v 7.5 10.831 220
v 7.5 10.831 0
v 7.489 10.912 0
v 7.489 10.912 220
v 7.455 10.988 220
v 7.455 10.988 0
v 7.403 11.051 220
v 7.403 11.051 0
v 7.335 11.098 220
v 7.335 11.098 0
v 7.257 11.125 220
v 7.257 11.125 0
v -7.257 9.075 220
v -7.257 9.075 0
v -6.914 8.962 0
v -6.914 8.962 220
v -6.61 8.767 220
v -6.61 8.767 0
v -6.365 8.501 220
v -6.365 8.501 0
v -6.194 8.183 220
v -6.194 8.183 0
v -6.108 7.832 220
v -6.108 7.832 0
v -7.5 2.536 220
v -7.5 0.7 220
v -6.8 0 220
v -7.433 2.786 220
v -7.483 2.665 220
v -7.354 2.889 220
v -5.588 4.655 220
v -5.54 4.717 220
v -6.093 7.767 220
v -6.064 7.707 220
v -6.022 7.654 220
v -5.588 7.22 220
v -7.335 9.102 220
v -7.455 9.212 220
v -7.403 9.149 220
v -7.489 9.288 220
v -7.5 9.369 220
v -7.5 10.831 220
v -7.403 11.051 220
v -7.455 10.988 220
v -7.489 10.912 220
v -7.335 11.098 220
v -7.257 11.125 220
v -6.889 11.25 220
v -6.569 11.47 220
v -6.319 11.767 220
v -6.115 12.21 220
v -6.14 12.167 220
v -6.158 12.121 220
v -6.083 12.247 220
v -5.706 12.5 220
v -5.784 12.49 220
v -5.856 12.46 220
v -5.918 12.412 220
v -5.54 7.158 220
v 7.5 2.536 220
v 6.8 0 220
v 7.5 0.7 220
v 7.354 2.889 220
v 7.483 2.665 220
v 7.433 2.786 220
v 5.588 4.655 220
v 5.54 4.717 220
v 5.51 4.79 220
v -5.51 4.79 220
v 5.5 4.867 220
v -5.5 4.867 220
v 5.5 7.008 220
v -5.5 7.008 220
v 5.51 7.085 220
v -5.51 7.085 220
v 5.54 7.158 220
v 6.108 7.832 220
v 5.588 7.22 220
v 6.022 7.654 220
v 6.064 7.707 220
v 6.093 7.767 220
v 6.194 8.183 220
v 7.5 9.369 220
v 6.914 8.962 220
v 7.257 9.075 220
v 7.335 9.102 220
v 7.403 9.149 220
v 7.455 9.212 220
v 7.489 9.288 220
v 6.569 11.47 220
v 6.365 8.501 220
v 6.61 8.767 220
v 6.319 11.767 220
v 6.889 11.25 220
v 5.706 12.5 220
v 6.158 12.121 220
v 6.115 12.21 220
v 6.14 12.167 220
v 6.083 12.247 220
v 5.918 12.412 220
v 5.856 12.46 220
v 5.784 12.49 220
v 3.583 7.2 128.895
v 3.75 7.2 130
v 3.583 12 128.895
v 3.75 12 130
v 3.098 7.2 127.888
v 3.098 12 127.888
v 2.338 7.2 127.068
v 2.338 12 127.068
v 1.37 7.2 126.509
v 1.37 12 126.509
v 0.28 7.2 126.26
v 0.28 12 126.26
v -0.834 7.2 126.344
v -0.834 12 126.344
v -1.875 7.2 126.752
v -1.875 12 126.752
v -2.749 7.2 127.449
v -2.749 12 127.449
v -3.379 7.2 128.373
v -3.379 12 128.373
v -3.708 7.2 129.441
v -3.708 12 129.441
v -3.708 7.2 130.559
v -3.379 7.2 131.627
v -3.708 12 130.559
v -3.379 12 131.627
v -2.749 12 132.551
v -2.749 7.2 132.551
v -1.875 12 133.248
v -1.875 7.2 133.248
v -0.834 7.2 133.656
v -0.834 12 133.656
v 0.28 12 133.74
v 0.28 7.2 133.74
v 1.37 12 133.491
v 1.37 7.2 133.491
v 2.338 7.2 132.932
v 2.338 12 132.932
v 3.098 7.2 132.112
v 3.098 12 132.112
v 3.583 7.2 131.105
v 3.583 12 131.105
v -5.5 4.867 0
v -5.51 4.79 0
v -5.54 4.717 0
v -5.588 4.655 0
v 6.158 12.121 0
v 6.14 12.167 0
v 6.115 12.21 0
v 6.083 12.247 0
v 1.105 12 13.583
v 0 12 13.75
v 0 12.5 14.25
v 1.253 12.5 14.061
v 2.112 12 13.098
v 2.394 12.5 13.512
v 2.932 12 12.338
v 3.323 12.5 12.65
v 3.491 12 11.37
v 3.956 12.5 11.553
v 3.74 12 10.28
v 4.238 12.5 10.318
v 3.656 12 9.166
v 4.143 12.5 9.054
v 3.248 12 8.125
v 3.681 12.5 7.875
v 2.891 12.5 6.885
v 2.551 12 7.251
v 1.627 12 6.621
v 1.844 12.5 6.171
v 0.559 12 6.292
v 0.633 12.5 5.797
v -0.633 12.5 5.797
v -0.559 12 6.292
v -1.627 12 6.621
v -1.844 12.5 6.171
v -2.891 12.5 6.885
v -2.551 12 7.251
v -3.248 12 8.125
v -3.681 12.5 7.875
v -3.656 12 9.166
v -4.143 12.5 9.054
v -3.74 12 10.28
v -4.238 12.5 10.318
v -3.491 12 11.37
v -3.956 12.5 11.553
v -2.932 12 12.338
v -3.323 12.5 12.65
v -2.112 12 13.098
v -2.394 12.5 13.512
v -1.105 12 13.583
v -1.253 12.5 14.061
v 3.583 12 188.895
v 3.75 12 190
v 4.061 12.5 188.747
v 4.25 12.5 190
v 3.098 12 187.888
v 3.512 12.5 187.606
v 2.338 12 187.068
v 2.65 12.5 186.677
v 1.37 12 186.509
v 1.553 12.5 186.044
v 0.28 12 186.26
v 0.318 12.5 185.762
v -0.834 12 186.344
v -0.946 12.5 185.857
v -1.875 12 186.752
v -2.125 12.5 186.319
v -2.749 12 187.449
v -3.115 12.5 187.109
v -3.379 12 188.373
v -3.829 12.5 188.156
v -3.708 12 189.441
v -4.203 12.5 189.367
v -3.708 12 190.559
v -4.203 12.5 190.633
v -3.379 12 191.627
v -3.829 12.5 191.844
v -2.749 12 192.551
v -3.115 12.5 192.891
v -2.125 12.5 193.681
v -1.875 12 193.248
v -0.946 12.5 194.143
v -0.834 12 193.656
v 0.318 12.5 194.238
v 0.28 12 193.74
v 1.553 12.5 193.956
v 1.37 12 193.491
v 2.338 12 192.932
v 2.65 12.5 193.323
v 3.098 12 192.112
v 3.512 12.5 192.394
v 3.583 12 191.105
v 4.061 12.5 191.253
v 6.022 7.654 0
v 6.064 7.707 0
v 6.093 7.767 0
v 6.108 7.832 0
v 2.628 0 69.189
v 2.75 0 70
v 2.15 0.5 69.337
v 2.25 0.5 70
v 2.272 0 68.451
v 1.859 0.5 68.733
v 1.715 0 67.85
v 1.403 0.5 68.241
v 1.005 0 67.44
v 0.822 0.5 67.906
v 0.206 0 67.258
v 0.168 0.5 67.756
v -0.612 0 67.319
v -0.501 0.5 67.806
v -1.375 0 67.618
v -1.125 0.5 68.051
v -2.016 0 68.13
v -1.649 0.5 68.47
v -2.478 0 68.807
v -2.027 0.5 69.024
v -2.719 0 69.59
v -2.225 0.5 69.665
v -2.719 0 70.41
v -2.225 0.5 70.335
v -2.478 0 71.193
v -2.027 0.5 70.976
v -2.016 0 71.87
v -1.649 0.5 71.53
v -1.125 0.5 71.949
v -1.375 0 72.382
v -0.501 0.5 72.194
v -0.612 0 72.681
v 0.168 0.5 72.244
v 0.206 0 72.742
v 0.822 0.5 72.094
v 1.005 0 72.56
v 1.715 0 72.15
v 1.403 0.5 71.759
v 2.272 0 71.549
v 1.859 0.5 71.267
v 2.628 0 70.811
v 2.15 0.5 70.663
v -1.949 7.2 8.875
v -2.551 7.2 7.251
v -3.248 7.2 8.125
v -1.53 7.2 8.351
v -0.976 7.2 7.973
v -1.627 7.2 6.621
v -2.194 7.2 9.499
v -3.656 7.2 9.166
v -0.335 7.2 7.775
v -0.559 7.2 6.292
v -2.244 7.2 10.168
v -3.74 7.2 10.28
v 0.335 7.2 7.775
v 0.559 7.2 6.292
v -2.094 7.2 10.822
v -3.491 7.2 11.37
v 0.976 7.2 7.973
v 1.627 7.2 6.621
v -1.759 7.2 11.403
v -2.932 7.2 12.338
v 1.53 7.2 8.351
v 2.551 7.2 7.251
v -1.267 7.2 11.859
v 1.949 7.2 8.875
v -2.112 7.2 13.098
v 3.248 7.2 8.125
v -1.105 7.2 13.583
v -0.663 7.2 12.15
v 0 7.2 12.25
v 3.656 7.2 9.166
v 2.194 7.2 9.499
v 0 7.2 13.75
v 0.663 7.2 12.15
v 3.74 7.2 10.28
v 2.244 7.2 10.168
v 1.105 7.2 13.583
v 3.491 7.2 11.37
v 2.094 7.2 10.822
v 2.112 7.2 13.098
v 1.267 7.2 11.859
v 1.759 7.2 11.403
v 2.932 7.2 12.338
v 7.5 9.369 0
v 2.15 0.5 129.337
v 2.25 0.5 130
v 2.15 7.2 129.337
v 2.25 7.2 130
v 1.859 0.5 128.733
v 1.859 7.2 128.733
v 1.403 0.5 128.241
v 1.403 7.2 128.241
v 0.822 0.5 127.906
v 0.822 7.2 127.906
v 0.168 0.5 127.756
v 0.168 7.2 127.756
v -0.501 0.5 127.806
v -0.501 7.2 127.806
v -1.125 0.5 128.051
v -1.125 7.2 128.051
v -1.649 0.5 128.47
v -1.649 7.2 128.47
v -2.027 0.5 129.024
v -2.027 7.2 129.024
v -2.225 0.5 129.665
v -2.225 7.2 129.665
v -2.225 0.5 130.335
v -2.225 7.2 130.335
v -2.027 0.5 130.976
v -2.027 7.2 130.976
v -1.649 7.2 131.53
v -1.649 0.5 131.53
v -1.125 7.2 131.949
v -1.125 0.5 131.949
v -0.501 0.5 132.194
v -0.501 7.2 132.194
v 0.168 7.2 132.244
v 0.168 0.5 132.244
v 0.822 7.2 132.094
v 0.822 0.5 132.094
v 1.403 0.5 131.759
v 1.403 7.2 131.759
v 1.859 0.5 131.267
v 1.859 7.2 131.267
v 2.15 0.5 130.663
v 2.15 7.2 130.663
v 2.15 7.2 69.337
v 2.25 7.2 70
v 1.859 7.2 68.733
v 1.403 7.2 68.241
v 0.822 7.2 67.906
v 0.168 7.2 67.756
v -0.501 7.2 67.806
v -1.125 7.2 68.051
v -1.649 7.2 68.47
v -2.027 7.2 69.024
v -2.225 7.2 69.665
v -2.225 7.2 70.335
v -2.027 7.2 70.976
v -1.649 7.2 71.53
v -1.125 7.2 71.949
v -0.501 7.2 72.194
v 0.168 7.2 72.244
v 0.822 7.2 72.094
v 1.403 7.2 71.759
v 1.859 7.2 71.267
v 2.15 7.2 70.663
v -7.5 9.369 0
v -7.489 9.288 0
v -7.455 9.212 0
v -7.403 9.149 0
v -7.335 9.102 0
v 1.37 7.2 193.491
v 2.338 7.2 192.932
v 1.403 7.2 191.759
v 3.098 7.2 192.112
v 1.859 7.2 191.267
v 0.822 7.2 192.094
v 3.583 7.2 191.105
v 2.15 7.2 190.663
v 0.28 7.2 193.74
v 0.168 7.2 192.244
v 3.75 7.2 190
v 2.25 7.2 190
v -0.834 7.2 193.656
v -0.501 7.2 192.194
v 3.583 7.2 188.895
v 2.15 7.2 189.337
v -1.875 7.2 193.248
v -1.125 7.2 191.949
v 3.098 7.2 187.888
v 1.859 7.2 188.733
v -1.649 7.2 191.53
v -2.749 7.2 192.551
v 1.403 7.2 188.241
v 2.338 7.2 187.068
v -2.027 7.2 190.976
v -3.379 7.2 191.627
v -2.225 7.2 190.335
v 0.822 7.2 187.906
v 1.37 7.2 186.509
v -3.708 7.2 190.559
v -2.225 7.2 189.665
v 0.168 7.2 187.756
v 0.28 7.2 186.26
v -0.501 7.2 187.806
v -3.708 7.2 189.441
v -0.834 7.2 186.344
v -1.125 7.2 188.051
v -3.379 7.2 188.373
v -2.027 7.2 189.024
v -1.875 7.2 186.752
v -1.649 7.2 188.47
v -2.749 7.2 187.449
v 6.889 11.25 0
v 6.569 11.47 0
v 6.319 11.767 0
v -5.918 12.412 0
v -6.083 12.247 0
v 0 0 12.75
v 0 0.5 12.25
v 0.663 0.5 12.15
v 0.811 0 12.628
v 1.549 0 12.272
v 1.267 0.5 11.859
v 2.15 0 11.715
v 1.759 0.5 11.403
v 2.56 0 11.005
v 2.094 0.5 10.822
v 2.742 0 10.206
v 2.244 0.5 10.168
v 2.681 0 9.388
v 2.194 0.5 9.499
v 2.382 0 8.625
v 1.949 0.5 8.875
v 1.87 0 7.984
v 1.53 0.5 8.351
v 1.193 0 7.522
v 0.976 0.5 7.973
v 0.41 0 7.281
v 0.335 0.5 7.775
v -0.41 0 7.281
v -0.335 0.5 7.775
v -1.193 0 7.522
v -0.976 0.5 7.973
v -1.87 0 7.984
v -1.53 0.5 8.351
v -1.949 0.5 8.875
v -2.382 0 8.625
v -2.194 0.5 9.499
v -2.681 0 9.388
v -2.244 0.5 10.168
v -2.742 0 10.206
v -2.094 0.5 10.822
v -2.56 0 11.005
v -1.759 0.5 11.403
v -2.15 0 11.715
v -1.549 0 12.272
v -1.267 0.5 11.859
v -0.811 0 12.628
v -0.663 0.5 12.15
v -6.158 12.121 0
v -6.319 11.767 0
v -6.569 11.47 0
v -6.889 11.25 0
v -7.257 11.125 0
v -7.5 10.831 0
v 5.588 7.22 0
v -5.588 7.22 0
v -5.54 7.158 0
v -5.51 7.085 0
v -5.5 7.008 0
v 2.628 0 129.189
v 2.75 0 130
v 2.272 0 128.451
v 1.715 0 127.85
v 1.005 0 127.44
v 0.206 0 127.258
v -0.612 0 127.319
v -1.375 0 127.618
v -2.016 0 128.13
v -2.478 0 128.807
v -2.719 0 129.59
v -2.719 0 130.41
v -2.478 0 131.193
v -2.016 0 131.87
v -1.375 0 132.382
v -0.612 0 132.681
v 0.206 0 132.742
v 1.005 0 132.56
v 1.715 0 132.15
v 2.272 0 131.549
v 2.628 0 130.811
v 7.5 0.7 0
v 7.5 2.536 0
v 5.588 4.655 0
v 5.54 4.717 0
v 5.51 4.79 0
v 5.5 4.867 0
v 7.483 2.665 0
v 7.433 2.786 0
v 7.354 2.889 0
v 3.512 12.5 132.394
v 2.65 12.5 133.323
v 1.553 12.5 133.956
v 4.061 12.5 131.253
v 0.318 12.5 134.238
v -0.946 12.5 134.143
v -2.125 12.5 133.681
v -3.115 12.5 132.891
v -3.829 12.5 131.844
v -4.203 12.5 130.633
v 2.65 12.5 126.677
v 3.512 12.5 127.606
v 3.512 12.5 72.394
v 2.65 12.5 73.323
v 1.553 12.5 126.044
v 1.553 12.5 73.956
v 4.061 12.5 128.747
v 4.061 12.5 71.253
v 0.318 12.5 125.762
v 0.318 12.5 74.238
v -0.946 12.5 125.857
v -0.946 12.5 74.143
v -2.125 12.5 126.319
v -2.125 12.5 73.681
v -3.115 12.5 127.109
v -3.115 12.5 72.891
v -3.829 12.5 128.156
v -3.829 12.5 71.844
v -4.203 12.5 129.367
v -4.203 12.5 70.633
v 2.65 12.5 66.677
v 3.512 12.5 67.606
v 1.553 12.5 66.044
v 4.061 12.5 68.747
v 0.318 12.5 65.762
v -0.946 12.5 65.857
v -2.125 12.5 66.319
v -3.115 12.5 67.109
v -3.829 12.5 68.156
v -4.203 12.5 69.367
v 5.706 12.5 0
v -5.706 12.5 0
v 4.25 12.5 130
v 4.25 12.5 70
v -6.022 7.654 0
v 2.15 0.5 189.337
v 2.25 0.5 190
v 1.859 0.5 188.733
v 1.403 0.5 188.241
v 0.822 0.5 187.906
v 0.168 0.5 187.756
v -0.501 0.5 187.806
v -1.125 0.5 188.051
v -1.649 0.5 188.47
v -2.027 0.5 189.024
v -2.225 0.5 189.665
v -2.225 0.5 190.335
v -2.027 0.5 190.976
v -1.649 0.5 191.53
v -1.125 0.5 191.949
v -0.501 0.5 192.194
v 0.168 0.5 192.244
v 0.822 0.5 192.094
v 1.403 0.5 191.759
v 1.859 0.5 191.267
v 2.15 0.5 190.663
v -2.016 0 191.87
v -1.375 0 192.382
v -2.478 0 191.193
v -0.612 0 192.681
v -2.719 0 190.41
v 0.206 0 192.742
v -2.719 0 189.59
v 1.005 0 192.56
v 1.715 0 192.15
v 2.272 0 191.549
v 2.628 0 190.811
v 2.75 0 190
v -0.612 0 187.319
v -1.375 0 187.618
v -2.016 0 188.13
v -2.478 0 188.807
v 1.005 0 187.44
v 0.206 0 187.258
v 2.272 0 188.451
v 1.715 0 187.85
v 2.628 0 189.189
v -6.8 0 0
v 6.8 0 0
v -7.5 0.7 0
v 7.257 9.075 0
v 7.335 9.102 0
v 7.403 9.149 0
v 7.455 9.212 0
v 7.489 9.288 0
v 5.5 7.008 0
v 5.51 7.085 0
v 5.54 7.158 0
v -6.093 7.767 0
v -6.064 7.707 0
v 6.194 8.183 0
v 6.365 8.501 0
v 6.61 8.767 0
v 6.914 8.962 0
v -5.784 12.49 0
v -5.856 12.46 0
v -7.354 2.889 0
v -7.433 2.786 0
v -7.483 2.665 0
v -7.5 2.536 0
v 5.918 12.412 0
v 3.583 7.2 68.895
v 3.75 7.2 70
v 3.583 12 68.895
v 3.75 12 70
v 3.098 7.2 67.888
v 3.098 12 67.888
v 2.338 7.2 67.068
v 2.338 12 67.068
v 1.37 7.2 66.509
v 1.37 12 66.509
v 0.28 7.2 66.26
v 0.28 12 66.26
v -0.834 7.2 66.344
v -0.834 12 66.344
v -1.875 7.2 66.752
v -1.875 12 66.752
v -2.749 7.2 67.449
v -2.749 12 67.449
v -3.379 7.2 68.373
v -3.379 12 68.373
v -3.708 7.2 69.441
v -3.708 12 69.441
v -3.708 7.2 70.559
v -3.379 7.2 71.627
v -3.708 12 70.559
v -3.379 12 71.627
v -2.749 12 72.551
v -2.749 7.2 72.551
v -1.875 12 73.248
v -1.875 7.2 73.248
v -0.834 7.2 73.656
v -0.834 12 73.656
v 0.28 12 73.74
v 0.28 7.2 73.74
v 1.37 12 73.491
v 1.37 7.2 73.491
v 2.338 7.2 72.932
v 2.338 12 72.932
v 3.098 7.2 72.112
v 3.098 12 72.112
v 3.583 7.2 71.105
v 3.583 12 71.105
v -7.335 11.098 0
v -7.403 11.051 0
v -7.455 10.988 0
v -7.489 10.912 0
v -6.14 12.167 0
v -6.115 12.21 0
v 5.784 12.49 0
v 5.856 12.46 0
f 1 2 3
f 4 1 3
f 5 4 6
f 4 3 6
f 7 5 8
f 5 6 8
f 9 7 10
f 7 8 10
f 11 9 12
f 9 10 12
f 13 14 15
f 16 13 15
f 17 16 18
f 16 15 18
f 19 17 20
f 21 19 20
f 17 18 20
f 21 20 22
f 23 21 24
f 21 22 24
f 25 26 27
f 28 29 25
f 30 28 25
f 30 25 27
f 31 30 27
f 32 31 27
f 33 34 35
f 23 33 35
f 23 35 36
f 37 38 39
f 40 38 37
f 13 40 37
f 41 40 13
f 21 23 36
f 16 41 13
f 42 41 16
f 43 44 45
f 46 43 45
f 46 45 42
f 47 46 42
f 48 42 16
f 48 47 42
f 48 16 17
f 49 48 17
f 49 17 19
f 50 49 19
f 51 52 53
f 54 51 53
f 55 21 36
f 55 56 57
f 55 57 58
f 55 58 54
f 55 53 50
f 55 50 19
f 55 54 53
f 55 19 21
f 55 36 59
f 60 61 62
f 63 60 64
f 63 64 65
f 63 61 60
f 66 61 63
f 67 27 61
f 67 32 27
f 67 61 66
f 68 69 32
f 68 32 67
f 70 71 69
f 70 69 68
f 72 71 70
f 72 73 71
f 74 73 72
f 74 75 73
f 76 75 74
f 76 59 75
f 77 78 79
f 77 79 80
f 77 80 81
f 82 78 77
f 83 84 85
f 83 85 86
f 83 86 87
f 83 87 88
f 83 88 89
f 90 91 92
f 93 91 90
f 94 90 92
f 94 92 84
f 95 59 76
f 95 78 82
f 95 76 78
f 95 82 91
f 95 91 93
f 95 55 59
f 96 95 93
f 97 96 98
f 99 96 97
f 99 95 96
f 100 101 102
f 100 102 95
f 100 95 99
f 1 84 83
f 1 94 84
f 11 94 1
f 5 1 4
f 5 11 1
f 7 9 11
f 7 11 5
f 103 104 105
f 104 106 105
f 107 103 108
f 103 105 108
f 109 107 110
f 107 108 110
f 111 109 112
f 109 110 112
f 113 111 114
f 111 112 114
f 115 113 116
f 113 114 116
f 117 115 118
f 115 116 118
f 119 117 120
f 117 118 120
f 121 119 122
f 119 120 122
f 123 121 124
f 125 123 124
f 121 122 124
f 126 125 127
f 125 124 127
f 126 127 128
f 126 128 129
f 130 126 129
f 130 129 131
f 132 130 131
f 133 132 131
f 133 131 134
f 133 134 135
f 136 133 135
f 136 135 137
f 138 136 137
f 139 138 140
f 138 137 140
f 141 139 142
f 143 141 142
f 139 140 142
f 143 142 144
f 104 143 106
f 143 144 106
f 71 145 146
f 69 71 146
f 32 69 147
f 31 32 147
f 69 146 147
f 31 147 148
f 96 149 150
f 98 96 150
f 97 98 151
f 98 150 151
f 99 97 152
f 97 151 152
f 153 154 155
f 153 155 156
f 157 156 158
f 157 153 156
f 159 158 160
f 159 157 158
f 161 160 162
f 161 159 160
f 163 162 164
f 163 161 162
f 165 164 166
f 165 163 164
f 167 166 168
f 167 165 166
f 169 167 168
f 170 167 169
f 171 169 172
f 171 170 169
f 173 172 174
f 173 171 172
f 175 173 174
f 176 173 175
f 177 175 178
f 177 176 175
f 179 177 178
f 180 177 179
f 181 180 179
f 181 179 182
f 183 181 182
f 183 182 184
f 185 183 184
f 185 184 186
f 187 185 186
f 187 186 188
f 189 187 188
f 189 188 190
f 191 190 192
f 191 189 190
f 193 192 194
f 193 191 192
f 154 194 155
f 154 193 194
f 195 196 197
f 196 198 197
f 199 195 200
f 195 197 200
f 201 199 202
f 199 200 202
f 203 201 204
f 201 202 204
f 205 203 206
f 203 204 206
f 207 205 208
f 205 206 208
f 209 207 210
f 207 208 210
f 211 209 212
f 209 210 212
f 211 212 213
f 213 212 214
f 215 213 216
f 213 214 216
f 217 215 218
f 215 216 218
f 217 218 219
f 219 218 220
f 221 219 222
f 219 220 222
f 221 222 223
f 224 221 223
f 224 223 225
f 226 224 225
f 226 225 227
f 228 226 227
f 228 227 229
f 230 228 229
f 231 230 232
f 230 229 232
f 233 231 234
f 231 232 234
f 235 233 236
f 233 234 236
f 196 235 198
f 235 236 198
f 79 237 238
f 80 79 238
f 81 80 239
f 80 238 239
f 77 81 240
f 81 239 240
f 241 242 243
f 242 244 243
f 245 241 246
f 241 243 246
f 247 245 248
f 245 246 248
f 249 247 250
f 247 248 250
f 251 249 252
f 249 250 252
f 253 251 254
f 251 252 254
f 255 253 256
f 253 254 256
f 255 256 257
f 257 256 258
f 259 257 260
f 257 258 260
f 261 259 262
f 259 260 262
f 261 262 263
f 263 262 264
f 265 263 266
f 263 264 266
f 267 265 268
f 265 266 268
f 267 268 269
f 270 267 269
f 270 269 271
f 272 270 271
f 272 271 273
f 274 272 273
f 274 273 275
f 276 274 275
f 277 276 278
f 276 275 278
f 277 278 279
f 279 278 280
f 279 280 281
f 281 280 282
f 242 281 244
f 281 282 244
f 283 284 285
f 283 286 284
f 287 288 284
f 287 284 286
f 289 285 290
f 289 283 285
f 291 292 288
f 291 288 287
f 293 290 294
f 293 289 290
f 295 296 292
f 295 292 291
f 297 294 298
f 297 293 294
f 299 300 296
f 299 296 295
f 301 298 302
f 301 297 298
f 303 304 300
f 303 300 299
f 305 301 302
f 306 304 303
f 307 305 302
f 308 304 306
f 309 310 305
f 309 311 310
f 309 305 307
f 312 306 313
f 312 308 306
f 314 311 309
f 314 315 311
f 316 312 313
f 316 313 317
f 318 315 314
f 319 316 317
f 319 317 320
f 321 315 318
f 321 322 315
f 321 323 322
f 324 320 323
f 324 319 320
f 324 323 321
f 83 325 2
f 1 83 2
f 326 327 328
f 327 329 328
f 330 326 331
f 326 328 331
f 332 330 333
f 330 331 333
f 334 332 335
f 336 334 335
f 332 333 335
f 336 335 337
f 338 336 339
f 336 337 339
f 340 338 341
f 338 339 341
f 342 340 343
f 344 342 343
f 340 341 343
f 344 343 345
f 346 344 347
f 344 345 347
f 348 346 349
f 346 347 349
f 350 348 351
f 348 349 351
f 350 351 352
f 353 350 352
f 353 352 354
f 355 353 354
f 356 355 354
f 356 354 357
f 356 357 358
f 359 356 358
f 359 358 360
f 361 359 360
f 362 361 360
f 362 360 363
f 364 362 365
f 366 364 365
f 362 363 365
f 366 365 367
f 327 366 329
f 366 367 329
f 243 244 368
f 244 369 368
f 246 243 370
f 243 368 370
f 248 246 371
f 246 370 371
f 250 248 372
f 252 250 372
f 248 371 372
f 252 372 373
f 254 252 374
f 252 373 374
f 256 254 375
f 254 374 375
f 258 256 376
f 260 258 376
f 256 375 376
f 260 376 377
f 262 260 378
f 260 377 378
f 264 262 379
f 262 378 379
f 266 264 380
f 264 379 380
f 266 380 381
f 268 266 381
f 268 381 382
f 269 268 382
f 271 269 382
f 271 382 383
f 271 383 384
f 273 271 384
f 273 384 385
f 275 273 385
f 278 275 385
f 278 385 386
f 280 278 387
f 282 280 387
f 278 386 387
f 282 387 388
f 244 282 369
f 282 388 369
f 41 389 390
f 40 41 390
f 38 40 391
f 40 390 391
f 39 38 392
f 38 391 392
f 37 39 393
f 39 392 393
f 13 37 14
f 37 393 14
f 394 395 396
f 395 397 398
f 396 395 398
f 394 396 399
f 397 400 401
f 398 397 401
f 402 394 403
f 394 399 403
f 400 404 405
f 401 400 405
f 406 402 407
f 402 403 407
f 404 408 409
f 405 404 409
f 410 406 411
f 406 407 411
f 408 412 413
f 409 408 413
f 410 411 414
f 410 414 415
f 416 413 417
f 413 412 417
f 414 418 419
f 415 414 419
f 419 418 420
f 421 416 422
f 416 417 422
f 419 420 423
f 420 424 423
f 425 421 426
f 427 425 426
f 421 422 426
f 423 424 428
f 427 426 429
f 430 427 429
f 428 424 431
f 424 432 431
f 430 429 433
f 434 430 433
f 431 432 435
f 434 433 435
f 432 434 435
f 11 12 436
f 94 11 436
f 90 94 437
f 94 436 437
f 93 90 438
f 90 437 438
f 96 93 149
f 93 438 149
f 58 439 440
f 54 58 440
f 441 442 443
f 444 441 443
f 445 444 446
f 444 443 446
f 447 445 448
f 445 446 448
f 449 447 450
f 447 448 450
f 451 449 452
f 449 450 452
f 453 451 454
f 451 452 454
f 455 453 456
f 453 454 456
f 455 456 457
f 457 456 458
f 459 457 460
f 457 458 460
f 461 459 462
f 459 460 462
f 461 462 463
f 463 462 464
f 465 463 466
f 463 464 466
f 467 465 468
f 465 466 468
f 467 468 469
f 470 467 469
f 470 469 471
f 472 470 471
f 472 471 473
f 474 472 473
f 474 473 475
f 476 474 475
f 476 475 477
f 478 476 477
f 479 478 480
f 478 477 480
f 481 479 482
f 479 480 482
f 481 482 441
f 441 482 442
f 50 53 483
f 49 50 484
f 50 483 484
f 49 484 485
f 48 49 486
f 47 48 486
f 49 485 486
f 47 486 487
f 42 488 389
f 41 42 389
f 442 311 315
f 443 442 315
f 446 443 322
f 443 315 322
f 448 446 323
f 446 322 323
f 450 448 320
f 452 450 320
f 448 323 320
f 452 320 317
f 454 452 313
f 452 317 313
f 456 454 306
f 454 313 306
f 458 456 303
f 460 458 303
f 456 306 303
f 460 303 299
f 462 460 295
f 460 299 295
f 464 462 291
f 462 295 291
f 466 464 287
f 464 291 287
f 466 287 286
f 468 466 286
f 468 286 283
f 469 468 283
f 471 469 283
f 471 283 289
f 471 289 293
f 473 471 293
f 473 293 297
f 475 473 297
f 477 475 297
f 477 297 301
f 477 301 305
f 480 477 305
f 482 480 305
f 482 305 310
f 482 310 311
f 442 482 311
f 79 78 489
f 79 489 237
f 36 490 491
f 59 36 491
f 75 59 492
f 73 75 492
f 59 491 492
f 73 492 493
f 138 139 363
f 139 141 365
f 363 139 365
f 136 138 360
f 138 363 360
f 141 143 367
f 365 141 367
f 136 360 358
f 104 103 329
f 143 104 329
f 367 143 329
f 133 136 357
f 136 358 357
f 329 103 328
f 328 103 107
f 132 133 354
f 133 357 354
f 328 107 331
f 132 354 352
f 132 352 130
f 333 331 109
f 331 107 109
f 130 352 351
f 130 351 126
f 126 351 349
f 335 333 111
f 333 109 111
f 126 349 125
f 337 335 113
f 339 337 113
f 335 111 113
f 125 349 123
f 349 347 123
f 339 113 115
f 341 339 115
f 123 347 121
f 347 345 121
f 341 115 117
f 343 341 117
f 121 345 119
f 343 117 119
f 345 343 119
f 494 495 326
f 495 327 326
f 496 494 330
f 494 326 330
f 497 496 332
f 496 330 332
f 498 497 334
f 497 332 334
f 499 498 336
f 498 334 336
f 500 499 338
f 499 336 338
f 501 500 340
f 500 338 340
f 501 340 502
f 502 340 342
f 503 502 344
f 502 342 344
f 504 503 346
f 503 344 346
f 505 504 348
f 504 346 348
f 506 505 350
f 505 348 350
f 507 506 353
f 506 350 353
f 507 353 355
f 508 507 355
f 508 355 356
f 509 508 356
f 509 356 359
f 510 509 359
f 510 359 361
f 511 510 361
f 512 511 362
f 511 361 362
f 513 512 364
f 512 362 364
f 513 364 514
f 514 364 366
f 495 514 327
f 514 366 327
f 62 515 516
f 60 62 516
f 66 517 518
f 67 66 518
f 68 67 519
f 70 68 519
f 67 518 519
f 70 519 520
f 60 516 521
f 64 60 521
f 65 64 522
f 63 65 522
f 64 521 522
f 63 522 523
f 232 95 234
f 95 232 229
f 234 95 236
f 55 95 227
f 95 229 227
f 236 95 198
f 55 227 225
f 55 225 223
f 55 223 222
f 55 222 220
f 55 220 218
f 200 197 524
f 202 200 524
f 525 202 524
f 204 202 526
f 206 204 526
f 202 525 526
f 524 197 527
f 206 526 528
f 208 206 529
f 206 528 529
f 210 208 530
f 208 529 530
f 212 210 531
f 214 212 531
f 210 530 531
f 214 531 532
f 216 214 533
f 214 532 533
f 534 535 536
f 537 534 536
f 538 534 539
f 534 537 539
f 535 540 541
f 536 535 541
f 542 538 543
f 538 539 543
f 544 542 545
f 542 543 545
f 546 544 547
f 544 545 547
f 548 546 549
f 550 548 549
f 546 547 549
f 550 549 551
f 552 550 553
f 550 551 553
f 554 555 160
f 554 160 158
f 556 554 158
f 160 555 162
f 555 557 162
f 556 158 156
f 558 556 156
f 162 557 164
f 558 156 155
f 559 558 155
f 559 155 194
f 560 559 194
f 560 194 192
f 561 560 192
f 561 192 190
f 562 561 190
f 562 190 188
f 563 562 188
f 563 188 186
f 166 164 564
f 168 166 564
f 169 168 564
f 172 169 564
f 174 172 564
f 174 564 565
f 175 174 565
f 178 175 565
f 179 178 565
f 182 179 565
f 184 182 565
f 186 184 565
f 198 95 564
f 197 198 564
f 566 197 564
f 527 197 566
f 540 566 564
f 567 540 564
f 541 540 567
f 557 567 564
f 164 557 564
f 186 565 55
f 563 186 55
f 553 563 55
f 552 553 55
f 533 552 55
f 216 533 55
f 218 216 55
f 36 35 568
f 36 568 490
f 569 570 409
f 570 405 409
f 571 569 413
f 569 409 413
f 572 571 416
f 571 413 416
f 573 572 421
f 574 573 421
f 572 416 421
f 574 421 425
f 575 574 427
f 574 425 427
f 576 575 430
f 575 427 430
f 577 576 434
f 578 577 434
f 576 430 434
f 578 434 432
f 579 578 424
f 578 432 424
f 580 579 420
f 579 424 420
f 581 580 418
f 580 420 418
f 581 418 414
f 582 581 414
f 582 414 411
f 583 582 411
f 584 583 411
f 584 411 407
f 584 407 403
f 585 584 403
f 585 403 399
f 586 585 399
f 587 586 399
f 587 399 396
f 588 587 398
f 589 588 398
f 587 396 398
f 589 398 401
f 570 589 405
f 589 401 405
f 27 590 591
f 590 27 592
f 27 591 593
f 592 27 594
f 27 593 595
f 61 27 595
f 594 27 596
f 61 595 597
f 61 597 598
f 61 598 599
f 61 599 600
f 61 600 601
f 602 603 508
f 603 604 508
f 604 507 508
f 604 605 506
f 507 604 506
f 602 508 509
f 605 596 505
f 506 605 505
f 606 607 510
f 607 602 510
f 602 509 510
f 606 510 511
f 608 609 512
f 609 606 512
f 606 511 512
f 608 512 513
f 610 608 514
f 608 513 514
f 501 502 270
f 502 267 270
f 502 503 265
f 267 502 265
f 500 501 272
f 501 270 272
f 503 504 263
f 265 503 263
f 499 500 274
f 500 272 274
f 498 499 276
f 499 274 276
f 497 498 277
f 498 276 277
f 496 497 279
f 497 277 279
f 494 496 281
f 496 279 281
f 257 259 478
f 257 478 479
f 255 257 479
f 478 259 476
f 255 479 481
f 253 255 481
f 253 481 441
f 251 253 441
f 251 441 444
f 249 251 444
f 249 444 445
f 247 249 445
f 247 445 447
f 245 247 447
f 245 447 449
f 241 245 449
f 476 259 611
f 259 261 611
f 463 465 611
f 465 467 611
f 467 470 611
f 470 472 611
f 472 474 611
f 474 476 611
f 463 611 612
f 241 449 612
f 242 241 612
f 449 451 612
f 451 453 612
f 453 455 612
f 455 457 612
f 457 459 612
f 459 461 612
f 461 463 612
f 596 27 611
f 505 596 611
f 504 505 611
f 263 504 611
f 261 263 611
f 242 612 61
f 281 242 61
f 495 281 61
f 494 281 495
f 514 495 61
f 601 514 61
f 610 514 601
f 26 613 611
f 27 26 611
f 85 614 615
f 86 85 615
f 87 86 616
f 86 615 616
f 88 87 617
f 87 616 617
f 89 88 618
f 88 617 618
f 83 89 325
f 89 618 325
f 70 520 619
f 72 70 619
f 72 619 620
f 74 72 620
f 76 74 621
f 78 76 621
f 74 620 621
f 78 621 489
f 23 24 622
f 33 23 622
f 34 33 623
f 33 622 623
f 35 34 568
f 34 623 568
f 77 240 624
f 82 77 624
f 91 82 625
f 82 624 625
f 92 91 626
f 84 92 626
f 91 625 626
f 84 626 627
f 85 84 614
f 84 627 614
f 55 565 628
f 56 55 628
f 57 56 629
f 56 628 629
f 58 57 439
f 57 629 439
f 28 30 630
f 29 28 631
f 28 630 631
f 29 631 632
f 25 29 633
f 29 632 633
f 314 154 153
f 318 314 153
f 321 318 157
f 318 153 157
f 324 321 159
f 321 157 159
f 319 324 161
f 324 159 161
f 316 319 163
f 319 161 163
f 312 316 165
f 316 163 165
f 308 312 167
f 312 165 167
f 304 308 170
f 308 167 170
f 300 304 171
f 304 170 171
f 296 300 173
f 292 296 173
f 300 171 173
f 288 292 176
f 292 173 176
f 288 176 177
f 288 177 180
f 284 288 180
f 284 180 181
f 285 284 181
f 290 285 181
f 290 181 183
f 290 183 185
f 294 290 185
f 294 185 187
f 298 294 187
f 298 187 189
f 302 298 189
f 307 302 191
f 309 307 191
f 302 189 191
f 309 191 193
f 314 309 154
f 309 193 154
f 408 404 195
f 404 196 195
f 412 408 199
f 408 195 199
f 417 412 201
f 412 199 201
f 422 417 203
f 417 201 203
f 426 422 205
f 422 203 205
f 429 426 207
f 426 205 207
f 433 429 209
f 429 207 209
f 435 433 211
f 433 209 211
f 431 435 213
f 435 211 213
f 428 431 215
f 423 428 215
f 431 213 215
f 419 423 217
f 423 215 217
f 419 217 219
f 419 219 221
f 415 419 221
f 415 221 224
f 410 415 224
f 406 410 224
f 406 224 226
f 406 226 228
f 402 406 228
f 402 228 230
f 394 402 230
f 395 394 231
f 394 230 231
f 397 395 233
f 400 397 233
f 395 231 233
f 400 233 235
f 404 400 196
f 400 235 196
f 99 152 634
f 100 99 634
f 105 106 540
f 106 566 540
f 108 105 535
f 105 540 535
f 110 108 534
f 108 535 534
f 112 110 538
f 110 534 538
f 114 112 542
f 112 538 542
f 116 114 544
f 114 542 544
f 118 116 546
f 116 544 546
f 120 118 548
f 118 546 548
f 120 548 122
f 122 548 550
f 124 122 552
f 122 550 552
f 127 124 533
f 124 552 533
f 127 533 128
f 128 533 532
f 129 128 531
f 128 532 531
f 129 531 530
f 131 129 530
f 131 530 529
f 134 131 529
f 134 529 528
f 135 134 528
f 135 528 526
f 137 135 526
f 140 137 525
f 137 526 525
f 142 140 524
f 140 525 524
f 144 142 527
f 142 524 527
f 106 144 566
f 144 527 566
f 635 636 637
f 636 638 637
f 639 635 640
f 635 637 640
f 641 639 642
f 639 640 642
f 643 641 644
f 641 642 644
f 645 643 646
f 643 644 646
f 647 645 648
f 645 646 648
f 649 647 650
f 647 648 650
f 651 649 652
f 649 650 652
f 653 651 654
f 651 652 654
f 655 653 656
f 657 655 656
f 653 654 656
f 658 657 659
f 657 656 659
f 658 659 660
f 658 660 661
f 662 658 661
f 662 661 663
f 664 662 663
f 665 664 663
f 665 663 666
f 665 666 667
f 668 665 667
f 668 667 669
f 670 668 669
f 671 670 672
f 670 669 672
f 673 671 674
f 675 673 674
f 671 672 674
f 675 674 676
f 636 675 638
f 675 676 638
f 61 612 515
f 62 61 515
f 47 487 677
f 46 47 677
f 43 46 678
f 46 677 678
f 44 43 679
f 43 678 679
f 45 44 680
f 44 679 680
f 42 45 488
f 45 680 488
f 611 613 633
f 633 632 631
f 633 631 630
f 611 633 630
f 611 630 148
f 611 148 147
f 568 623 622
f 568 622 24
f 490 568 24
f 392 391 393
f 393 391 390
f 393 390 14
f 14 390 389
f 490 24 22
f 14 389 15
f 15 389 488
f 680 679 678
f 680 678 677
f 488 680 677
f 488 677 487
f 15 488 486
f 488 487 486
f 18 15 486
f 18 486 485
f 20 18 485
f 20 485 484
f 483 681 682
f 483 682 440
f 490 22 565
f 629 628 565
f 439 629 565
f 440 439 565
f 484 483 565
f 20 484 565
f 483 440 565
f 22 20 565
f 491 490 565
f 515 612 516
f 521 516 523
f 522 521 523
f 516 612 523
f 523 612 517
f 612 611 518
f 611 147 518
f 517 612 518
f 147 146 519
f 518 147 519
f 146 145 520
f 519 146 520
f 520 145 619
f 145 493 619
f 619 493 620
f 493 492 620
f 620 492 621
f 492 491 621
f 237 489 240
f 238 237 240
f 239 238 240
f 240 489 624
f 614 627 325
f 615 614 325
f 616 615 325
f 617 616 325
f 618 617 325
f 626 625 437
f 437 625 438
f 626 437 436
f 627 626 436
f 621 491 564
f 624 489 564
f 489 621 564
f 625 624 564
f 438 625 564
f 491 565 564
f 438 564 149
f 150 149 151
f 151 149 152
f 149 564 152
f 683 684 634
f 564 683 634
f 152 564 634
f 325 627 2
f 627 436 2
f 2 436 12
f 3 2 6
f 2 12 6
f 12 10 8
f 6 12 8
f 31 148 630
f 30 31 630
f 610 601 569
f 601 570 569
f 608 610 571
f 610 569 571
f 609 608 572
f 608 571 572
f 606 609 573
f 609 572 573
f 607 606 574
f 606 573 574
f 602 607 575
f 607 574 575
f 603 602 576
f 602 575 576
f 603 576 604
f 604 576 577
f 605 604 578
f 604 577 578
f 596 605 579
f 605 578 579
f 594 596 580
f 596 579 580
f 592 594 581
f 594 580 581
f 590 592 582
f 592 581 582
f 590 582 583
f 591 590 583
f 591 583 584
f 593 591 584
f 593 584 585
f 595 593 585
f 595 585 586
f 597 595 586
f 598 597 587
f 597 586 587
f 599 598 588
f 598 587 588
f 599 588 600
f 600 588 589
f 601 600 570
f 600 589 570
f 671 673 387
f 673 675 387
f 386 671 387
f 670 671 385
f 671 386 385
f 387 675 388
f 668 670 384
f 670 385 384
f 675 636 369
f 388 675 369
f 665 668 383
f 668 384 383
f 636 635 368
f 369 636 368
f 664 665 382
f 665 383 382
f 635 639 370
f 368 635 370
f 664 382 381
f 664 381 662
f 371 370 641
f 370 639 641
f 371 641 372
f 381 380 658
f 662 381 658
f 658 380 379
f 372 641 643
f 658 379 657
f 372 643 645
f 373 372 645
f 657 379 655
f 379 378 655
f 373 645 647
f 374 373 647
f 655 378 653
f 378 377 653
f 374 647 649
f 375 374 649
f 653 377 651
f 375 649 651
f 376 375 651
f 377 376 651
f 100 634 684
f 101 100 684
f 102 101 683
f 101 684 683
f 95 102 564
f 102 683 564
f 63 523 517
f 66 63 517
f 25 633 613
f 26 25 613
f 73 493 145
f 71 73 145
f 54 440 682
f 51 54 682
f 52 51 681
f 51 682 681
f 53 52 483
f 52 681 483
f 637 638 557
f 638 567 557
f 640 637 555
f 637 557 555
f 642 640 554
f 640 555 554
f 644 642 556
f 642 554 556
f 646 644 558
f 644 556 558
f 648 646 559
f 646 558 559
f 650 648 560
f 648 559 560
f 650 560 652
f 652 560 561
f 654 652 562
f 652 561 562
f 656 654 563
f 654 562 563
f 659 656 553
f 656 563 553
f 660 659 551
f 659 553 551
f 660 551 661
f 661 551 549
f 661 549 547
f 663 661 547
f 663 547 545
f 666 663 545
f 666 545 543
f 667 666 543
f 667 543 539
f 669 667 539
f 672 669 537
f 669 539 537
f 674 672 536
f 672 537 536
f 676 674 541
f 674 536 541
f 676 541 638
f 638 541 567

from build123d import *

# Parameters (mm, degrees)
BOSS_EXTRUDE1_DEPTH = 220
SKETCH2_R           = 3.75
CUT_EXTRUDE1_DEPTH  = 5.3
SKETCH3_R           = 2.25
CUT_EXTRUDE2_DEPTH  = 221.245522088
CHAMFER1_SIZE       = 0.5


# Read off the part's stored shape, not the designer's step: LPattern1
with BuildPart() as part:
    # Sketch1 → Boss-Extrude1 (new body)
    with BuildSketch(Plane.XY):
        with BuildLine():
            Line((-5.587867966, 4.655032034), (-7.353553391, 2.889346609))
            ThreePointArc((-7.353553391, 2.889346609), (-7.461939766, 2.727134935), (-7.5, 2.535793219))
            Line((-7.5, 2.535793219), (-7.5, 0.7))
            Line((-7.5, 0.7), (-6.8, 0))
            Line((-6.8, 0), (6.8, 0))
            Line((6.8, 0), (7.5, 0.7))
            Line((7.5, 0.7), (7.5, 2.535793219))
            ThreePointArc((7.5, 2.535793219), (7.461939766, 2.727134935), (7.353553391, 2.889346609))
            Line((7.353553391, 2.889346609), (5.587867966, 4.655032034))
            ThreePointArc((5.587867966, 4.655032034), (5.52283614, 4.752359039), (5.5, 4.867164069))
            Line((5.5, 4.867164069), (5.5, 7.007735931))
            ThreePointArc((5.5, 7.007735931), (5.52283614, 7.122540961), (5.587867966, 7.219867966))
            Line((5.587867966, 7.219867966), (6.022194074, 7.654194074))
            ThreePointArc((6.022194074, 7.654194074), (6.08029105, 7.736033047), (6.108143767, 7.832454529))
            ThreePointArc((6.108143767, 7.832454529), (6.479087517, 8.641867539), (7.257052023, 9.074903237))
            ThreePointArc((7.257052023, 9.074903237), (7.431425589, 9.178529998), (7.5, 9.369428391))
            Line((7.5, 9.369428391), (7.5, 10.830571609))
            ThreePointArc((7.5, 10.830571609), (7.431425589, 11.021470002), (7.257052023, 11.125096763))
            ThreePointArc((7.257052023, 11.125096763), (6.568589176, 11.46951378), (6.158449701, 12.120965838))
            ThreePointArc((6.158449701, 12.120965838), (6.128637664, 12.188930096), (6.0830537, 12.2474963))
            Line((6.0830537, 12.2474963), (5.918417966, 12.412132034))
            ThreePointArc((5.918417966, 12.412132034), (5.821090961, 12.47716386), (5.706285931, 12.5))
            Line((5.706285931, 12.5), (-5.706285931, 12.5))
            ThreePointArc((-5.706285931, 12.5), (-5.821090961, 12.47716386), (-5.918417966, 12.412132034))
            Line((-5.918417966, 12.412132034), (-6.0830537, 12.2474963))
            ThreePointArc((-6.0830537, 12.2474963), (-6.128637664, 12.188930096), (-6.158449701, 12.120965838))
            ThreePointArc((-6.158449701, 12.120965838), (-6.568589176, 11.46951378), (-7.257052023, 11.125096763))
            ThreePointArc((-7.257052023, 11.125096763), (-7.431425589, 11.021470002), (-7.5, 10.830571609))
            Line((-7.5, 10.830571609), (-7.5, 9.369428391))
            ThreePointArc((-7.5, 9.369428391), (-7.431425589, 9.178529998), (-7.257052023, 9.074903237))
            ThreePointArc((-7.257052023, 9.074903237), (-6.479087517, 8.641867539), (-6.108143767, 7.832454529))
            ThreePointArc((-6.108143767, 7.832454529), (-6.08029105, 7.736033047), (-6.022194074, 7.654194074))
            Line((-6.022194074, 7.654194074), (-5.587867966, 7.219867966))
            ThreePointArc((-5.587867966, 7.219867966), (-5.52283614, 7.122540961), (-5.5, 7.007735931))
            Line((-5.5, 7.007735931), (-5.5, 4.867164069))
            ThreePointArc((-5.5, 4.867164069), (-5.52283614, 4.752359039), (-5.587867966, 4.655032034))
        make_face()
    extrude(amount=BOSS_EXTRUDE1_DEPTH)

    # Sketch2 → Cut-Extrude1 (cut)
    with BuildSketch(Plane(origin=(0, 12.5, 0), x_dir=(1, 0, 0), z_dir=(0, 1, 0))):
        with Locations(Location((0, -10, 0), (0, 0, 270))):
            Circle(SKETCH2_R)
    extrude(amount=-CUT_EXTRUDE1_DEPTH, mode=Mode.SUBTRACT)

    # Sketch3 → Cut-Extrude2 (cut, through all)
    with BuildSketch(Plane(origin=(0, 7.2, 0), x_dir=(1, 0, 0), z_dir=(0, 1, 0))):
        with Locations(Location((0, -10, 0), (0, 0, 270))):
            Circle(SKETCH3_R)
    extrude(amount=-CUT_EXTRUDE2_DEPTH, mode=Mode.SUBTRACT)

    # Chamfer1
    chamfer1_edges = [part.edges().sort_by_distance(p)[0] for p in [
        (0, 12.5, 6.25),
        (0, 0, 7.75),
    ]]
    chamfer(chamfer1_edges, length=CHAMFER1_SIZE)

    # LPattern1 outline → LPattern1 (revolve, cut)
    with BuildSketch(Plane.XY.offset(190)):
        Polygon((0, 0), (2.75, 0), (2.25, 0.5), (2.25, 7.2), (3.75, 7.2), (3.75, 12), (4.25, 12.5), (0, 12.5), align=None)
    revolve(axis=Axis((0, 0, 190), (0, 1, 0)), mode=Mode.SUBTRACT)

    # LPattern1 2 outline → LPattern1 2 (revolve, cut)
    with BuildSketch(Plane.XY.offset(130)):
        Polygon((0, 12.5), (0, 0), (2.75, 0), (2.25, 0.5), (2.25, 7.2), (3.75, 7.2), (3.75, 12), (4.25, 12.5), align=None)
    revolve(axis=Axis((0, 0, 130), (0, 1, 0)), mode=Mode.SUBTRACT)

    # LPattern1 3 outline → LPattern1 3 (revolve, cut)
    with BuildSketch(Plane.XY.offset(70)):
        Polygon((0, 12.5), (0, 0), (2.75, 0), (2.25, 0.5), (2.25, 7.2), (3.75, 7.2), (3.75, 12), (4.25, 12.5), align=None)
    revolve(axis=Axis((0, 0, 70), (0, 1, 0)), mode=Mode.SUBTRACT)


solid = part.part
